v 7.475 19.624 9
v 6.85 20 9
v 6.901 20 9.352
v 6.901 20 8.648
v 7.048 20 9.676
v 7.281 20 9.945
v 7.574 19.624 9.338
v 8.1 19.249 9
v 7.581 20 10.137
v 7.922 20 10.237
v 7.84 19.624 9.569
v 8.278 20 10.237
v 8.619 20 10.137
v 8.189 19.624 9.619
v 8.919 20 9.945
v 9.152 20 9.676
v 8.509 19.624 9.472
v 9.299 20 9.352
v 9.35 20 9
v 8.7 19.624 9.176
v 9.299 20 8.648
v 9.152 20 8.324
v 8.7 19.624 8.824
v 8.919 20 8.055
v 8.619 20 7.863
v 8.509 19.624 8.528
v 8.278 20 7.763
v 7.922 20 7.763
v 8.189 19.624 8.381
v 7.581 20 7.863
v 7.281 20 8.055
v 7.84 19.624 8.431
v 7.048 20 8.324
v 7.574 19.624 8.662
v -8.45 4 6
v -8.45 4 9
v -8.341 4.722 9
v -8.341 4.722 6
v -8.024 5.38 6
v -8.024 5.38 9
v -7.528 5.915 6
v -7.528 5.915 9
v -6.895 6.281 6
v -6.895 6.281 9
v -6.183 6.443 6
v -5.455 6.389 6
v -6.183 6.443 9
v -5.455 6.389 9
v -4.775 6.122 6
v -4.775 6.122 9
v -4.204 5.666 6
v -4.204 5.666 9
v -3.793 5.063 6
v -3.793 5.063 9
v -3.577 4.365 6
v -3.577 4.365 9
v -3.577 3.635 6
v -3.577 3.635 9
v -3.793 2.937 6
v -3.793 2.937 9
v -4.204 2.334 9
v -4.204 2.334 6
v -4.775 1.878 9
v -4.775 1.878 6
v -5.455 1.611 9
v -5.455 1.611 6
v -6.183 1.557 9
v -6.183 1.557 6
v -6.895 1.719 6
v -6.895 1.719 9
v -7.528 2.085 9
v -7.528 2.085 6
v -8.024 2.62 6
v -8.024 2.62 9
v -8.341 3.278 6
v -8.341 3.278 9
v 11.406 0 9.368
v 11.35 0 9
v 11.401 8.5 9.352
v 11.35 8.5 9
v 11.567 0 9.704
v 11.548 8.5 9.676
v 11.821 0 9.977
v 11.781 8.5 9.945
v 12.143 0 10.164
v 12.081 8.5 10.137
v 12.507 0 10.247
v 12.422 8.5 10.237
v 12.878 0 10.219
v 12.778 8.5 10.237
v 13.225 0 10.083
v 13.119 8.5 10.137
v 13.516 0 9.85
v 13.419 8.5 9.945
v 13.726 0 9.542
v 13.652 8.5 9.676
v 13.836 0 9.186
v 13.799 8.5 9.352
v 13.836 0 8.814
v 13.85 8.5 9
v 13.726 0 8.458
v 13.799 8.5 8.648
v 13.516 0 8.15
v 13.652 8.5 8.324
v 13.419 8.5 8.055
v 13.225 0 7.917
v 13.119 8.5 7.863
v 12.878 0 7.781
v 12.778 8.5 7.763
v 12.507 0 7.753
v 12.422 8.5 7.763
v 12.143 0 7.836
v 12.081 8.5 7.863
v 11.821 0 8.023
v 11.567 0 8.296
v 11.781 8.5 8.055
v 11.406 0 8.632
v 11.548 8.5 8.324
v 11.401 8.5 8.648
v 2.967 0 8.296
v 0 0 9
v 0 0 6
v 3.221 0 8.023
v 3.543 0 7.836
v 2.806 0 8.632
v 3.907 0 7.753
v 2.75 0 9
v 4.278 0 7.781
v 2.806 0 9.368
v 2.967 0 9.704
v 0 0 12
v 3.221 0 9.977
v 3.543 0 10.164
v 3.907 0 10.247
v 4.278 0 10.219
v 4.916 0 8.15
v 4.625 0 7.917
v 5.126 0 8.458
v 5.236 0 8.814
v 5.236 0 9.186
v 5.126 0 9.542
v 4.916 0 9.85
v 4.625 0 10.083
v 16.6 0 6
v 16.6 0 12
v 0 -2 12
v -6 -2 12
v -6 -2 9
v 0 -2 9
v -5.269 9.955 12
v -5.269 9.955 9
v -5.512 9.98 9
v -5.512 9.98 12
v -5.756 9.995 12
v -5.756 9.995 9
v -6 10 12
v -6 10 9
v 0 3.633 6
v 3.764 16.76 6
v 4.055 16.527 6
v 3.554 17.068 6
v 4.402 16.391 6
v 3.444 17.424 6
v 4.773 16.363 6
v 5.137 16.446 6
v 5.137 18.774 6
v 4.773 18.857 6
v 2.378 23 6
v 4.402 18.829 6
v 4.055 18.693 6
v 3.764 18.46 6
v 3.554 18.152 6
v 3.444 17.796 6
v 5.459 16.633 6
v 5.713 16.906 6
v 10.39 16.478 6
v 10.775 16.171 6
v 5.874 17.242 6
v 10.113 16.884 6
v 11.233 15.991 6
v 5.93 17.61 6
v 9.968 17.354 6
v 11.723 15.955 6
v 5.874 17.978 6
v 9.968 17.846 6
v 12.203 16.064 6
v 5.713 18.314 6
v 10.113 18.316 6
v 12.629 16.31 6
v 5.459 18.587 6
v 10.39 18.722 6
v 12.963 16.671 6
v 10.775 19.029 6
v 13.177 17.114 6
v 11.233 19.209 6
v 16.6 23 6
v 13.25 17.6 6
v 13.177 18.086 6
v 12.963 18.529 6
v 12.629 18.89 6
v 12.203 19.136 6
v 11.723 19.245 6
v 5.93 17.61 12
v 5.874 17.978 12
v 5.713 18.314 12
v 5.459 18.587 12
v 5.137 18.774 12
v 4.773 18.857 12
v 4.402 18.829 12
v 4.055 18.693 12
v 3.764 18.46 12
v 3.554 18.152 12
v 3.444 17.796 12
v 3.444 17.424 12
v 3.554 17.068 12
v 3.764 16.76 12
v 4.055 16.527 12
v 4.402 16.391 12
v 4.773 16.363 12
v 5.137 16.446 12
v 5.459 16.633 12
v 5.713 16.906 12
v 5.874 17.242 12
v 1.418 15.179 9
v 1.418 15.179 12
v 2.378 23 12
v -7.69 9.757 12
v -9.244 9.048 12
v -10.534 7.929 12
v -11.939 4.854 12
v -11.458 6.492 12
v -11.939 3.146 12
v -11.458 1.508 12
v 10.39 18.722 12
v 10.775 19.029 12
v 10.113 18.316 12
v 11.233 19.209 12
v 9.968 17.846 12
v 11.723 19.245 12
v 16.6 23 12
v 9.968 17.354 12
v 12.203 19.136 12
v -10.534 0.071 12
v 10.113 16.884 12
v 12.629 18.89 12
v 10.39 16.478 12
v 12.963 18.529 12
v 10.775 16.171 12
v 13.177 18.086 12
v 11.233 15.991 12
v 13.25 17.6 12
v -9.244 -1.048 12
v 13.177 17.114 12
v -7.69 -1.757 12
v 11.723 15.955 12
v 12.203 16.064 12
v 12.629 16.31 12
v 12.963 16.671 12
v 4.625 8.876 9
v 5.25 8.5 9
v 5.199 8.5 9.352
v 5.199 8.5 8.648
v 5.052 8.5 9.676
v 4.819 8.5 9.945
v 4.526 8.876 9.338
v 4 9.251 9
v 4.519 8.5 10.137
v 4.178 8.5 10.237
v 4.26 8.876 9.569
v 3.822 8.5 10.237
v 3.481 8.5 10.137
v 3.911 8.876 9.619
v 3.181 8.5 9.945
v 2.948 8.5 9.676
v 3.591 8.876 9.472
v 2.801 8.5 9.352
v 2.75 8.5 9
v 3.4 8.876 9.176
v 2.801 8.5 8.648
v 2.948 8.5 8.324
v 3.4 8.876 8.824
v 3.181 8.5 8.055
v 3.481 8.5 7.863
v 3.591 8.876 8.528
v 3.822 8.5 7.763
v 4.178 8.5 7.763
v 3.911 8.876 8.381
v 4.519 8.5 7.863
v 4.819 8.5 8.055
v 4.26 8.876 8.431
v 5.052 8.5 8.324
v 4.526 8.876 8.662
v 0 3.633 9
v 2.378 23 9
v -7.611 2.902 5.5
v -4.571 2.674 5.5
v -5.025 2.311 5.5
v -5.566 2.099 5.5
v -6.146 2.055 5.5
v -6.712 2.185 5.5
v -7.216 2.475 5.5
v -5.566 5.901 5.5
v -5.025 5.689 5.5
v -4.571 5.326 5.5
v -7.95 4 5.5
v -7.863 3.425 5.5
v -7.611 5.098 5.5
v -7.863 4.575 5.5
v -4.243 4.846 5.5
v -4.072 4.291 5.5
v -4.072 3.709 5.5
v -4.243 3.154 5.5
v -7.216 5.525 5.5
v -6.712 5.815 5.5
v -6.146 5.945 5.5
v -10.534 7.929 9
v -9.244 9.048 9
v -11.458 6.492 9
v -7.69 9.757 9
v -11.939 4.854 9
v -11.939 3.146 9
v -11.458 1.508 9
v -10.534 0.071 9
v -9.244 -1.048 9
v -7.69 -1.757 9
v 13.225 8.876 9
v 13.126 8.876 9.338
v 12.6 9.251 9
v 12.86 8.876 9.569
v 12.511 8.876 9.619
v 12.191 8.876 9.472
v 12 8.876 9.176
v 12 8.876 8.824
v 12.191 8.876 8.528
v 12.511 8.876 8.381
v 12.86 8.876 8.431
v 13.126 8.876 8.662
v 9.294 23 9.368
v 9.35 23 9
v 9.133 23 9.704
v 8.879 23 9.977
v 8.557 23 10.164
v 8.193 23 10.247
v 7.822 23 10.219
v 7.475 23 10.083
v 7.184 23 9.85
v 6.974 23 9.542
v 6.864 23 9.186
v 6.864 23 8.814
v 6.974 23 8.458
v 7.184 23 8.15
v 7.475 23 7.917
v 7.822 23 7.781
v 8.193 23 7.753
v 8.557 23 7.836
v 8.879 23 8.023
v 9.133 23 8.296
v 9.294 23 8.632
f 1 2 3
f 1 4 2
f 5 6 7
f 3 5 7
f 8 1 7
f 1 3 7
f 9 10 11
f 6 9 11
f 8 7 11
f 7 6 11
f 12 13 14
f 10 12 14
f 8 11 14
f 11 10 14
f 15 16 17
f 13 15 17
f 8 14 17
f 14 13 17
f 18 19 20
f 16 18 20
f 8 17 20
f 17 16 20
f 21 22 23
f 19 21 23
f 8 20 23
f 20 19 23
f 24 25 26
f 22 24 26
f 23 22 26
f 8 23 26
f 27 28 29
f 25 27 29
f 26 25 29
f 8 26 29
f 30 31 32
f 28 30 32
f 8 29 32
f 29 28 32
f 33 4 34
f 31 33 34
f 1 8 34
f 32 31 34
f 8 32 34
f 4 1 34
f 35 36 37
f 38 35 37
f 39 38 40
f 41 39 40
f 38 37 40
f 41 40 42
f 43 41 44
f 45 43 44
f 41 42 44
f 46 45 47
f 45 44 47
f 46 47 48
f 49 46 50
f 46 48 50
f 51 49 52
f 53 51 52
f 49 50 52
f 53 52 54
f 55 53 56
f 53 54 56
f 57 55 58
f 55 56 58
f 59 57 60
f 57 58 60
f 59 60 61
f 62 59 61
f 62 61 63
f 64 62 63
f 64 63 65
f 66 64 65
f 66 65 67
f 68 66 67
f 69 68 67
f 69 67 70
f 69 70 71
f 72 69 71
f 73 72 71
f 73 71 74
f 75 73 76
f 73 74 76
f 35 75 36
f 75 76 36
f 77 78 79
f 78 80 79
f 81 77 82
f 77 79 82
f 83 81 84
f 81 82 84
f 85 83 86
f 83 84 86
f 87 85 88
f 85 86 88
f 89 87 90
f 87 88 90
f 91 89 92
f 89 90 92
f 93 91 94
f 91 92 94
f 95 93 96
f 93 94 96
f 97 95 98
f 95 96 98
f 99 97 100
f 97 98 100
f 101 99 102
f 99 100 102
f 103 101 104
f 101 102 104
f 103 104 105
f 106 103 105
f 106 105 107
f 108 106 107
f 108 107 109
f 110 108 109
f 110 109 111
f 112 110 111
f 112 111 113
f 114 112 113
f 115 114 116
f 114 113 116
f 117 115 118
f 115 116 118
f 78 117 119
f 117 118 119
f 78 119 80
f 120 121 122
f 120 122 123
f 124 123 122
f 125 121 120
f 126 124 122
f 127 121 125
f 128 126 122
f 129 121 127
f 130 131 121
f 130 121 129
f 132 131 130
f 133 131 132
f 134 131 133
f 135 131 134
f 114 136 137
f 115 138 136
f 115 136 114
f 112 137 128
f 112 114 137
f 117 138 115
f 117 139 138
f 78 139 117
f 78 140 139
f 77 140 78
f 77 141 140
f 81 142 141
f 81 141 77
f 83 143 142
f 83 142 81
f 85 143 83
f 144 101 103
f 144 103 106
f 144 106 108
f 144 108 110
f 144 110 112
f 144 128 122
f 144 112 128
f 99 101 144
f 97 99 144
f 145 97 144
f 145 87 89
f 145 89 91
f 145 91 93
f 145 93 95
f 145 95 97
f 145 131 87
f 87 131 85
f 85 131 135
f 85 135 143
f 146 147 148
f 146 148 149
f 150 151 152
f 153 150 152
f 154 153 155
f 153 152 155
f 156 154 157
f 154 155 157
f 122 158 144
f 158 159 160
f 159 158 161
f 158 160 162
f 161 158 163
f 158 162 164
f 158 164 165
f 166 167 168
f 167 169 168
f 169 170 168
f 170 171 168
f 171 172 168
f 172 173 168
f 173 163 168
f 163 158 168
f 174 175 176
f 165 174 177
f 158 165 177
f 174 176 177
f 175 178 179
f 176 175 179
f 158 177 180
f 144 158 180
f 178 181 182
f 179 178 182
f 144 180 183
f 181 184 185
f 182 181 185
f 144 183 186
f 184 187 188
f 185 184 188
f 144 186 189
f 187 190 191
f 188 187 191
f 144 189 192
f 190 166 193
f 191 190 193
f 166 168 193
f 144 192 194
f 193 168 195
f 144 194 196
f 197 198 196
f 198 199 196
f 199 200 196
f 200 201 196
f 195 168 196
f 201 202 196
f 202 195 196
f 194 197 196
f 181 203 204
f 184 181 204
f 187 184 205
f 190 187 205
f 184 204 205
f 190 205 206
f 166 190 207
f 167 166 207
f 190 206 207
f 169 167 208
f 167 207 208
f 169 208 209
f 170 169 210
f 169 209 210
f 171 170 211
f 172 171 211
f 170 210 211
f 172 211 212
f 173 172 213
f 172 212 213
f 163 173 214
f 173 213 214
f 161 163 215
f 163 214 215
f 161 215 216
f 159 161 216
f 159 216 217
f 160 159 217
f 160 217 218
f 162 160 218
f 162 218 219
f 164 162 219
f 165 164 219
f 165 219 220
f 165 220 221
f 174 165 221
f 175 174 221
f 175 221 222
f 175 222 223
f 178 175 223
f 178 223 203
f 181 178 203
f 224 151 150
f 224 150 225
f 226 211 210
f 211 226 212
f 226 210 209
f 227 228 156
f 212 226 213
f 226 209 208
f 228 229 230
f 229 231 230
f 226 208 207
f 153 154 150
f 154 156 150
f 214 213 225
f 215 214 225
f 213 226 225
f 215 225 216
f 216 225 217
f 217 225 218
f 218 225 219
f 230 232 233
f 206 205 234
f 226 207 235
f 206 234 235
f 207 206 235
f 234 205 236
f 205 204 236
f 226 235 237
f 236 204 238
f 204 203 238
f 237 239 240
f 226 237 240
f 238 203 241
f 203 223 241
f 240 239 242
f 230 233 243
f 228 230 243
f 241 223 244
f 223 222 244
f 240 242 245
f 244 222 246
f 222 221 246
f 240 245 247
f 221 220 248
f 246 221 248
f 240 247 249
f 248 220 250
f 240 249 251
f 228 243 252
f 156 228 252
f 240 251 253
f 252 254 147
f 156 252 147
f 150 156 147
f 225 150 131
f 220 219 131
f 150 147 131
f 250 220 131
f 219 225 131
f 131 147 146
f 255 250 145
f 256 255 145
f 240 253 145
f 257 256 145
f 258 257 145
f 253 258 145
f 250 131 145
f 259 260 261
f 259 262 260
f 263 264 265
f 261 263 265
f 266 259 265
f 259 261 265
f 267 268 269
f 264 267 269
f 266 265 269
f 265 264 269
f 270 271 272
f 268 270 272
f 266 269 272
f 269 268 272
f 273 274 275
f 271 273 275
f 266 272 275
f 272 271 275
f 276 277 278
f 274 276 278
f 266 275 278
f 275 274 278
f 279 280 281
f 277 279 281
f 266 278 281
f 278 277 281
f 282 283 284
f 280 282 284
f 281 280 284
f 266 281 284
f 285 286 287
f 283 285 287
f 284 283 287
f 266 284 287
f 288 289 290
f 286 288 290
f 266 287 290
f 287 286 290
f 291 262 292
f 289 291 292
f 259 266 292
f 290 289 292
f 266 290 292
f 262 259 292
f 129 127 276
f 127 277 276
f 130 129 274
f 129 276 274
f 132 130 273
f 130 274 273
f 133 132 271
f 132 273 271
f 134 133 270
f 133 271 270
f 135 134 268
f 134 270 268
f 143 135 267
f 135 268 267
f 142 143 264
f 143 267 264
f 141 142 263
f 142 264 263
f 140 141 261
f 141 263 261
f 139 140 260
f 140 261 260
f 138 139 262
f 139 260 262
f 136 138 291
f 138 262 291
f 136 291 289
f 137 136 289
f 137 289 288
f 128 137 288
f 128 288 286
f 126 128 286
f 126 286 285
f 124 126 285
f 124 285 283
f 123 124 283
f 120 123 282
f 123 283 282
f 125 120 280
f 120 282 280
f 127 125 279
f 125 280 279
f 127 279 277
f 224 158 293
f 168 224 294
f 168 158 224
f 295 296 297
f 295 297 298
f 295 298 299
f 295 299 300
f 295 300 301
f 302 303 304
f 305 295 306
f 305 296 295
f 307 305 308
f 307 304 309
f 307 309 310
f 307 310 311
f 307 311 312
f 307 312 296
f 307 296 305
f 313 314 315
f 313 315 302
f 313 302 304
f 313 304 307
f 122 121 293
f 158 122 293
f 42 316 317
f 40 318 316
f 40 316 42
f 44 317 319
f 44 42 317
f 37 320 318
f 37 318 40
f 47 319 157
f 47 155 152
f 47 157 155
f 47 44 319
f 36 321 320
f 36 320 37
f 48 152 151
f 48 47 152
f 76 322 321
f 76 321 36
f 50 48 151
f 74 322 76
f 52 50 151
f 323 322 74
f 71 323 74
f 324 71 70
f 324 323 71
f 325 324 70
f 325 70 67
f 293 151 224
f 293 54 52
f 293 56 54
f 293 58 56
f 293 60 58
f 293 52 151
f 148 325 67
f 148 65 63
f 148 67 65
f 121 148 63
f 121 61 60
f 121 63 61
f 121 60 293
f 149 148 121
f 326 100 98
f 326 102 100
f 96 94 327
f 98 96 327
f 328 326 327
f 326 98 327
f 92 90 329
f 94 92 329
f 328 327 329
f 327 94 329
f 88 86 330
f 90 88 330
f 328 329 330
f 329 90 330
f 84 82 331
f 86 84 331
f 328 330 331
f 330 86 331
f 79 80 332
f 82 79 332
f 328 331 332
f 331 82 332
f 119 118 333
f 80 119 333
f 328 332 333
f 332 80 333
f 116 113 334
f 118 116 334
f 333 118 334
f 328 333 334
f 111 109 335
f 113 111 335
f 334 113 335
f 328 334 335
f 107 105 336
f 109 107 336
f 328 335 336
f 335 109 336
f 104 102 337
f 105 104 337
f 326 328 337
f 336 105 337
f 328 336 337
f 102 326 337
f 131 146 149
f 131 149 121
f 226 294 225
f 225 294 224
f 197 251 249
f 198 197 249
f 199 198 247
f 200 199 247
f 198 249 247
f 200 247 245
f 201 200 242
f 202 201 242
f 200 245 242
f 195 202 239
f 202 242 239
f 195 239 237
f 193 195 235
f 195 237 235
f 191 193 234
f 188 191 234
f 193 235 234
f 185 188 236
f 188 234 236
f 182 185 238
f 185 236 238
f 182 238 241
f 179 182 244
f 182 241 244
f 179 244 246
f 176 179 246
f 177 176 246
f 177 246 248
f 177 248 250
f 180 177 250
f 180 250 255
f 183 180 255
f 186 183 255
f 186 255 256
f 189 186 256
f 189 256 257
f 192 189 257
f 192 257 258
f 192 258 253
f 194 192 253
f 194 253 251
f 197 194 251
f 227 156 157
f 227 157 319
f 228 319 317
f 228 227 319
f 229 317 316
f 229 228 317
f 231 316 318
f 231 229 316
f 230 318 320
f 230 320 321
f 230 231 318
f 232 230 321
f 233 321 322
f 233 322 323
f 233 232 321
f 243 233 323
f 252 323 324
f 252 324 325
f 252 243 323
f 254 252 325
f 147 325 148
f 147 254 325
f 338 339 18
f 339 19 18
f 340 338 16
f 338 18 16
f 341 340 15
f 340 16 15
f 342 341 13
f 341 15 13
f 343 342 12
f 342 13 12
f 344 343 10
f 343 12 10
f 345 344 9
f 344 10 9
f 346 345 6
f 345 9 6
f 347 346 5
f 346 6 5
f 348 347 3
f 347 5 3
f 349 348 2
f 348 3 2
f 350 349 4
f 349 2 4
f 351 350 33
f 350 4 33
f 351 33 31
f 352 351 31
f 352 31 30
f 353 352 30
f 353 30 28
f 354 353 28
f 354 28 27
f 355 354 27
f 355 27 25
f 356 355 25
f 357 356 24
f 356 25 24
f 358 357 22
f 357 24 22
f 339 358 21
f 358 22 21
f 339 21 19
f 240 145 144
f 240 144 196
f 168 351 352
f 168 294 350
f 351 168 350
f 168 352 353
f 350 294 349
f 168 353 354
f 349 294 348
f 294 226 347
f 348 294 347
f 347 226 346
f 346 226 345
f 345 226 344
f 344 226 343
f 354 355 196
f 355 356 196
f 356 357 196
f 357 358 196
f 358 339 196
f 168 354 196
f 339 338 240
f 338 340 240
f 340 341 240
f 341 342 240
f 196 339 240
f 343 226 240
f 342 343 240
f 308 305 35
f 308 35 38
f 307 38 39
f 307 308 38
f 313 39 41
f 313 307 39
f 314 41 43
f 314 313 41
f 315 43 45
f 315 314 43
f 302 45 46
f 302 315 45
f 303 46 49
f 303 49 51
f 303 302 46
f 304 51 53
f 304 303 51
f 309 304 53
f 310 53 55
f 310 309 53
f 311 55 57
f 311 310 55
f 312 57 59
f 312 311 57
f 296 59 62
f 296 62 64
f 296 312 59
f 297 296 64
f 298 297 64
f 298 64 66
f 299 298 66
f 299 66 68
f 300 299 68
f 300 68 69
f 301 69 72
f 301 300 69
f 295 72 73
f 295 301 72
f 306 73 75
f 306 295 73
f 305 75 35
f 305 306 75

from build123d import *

# Parameters (mm, degrees)
RESSALTO_EXTRUS_O1_DEPTH      = 3
ESBO_O1_3_W                   = 16.6
ESBO_O1_3_H                   = 23
ESBO_O1_3_R                   = 1.5
ESBO_O1_3_R_2                 = 0.5
RESSALTO_EXTRUS_O2_DEPTH      = 6
CORTE_EXTRUS_O1_DEPTH         = 3
CORTE_EXTRUS_O2_DEPTH         = 3
CHANFRO1_SIZE                 = 6
FURO_ROSCADO_DE_M3X0_51_D     = 2.5
FURO_ROSCADO_DE_M3X0_51_DEPTH = 8.5
FURO_ROSCADO_DE_M3X0_51_TIP   = 0.751075774
FURO_ROSCADO_DE_M3X0_52_D     = 2.5
FURO_ROSCADO_DE_M3X0_53_D     = 2.5
FURO_ROSCADO_DE_M3X0_53_DEPTH = 3
FURO_ROSCADO_DE_M3X0_53_TIP   = 0.751075774
ESBO_O17_R                    = 2.45
RESSALTO_EXTRUS_O3_DEPTH      = 3.5
CHANFRO2_SIZE                 = 0.5
FURO_ROSCADO_DE_M4X0_73_D     = 3.3
FURO_ROSCADO_DE_M4X0_73_DEPTH = 11.5
FURO_ROSCADO_DE_M4X0_73_TIP   = 0.991420021


with BuildPart() as part:
    # Esboço1 → Ressalto-extrusão1 (new body)
    with BuildSketch(Plane.XY):
        with BuildLine():
            Line((0, -2), (0, 0))
            Line((0, 0), (0, 16))
            ThreePointArc((0, 16), (-1.757359313, 11.757359313), (-6, 10))
            ThreePointArc((-6, 10), (-12, 4), (-6, -2))
            Line((-6, -2), (0, -2))
        make_face()
    extrude(amount=RESSALTO_EXTRUS_O1_DEPTH)

    # Esboço1<3> → Ressalto-extrusão2 (add)
    with BuildSketch(Plane.XY):
        with Locations((8.3, 11.5)):
            Rectangle(ESBO_O1_3_W, ESBO_O1_3_H)
        with Locations((11.6, 17.6)):
            Circle(ESBO_O1_3_R, mode=Mode.SUBTRACT)
        with Locations((4.68, 17.61)):
            Circle(ESBO_O1_3_R_2, mode=Mode.SUBTRACT)
    extrude(amount=RESSALTO_EXTRUS_O2_DEPTH)


with BuildPart() as body_2:
    # Espelhar1: mirrored copy
    add(part.part.mirror(Plane.XY.offset(6)))

    # Esboço4 → Corte-extrusão1 (cut)
    with BuildSketch(Plane(origin=(0, 0, 6), x_dir=(-1, 0, 0), z_dir=(0, 0, -1))):
        Polygon((0, 3.633024279), (-2.37796561, 23), (0, 23), align=None)
    extrude(amount=-CORTE_EXTRUS_O1_DEPTH, mode=Mode.SUBTRACT)

    # Esboço5 → Corte-extrusão2 (cut)
    with BuildSketch(Plane(origin=(0, 0, 9), x_dir=(-1, 0, 0), z_dir=(0, 0, -1))):
        with BuildLine():
            Line((-0.68649297, 9.224060849), (5.26878394, 9.95527691))
            ThreePointArc((5.26878394, 9.95527691), (5.633708763, 9.988808791), (6, 10))
            ThreePointArc((6, 10), (1.757359313, 11.757359313), (0, 16))
            Line((0, 16), (0, 23))
            Line((0, 23), (-2.37796561, 23))
            Line((-2.37796561, 23), (-0.68649297, 9.224060849))
        make_face()
    extrude(amount=-CORTE_EXTRUS_O2_DEPTH, mode=Mode.SUBTRACT)

    # Chanfro1
    # the kernel refuses this chamfer: 6 mm, written as the material it adds along each edge
    with BuildSketch(Plane(origin=(0.68649297, 9.224060849, 9), x_dir=(-0.9955217911555101, 0.09453234015153285, 0), z_dir=(0, 0, 1))) as chanfro1_piece_1:
        Polygon((CHANFRO1_SIZE * 0.999621916911, -CHANFRO1_SIZE * 0.0274958766106), (-CHANFRO1_SIZE * 0.0274958766106, -CHANFRO1_SIZE * 0.999621916911), (0, 0), align=None)
    extrude(amount=3)

    # Furo roscado de M3x0.51
    with Locations(Plane.XZ):
        with Locations((4, 9), (12.6, 9)):
            Hole(FURO_ROSCADO_DE_M3X0_51_D / 2, depth=FURO_ROSCADO_DE_M3X0_51_DEPTH)
            with Locations((0, 0, -(FURO_ROSCADO_DE_M3X0_51_DEPTH + FURO_ROSCADO_DE_M3X0_51_TIP / 2))):  # 118° drill point
                Cone(0, FURO_ROSCADO_DE_M3X0_51_D / 2, FURO_ROSCADO_DE_M3X0_51_TIP, mode=Mode.SUBTRACT)

    # Furo roscado de M3x0.52 (through all)
    with Locations(Plane(origin=(0, 0, 6), x_dir=(-1, 0, 0), z_dir=(0, 0, -1))):
        with Locations((-4.68, 17.61)):
            Hole(FURO_ROSCADO_DE_M3X0_52_D / 2)

    # Furo roscado de M3x0.53
    with Locations(Plane(origin=(0, 23, 0), x_dir=(-1, 0, 0), z_dir=(0, 1, 0))):
        with Locations((-8.1, 9)):
            Hole(FURO_ROSCADO_DE_M3X0_53_D / 2, depth=FURO_ROSCADO_DE_M3X0_53_DEPTH)
            with Locations((0, 0, -(FURO_ROSCADO_DE_M3X0_53_DEPTH + FURO_ROSCADO_DE_M3X0_53_TIP / 2))):  # 118° drill point
                Cone(0, FURO_ROSCADO_DE_M3X0_53_D / 2, FURO_ROSCADO_DE_M3X0_53_TIP, mode=Mode.SUBTRACT)

    # Esboço17 → Ressalto-extrusão3 (add)
    with BuildSketch(Plane(origin=(0, 0, 9), x_dir=(-1, 0, 0), z_dir=(0, 0, -1))):
        with Locations((6, 4)):
            Circle(ESBO_O17_R)
    extrude(amount=RESSALTO_EXTRUS_O3_DEPTH)

    # Chanfro2
    chanfro2_edges = [body_2.edges().sort_by_distance(p)[0] for p in [
        (-3.55, 4, 5.5),
    ]]
    chamfer(chanfro2_edges, length=CHANFRO2_SIZE)

    # Furo roscado de M4x0.73
    with Locations(Plane(origin=(0, 0, 6), x_dir=(-1, 0, 0), z_dir=(0, 0, -1))):
        with Locations((-11.6, 17.6)):
            Hole(FURO_ROSCADO_DE_M4X0_73_D / 2, depth=FURO_ROSCADO_DE_M4X0_73_DEPTH)
            with Locations((0, 0, -(FURO_ROSCADO_DE_M4X0_73_DEPTH + FURO_ROSCADO_DE_M4X0_73_TIP / 2))):  # 118° drill point
                Cone(0, FURO_ROSCADO_DE_M4X0_73_D / 2, FURO_ROSCADO_DE_M4X0_73_TIP, mode=Mode.SUBTRACT)


solid = body_2.part
